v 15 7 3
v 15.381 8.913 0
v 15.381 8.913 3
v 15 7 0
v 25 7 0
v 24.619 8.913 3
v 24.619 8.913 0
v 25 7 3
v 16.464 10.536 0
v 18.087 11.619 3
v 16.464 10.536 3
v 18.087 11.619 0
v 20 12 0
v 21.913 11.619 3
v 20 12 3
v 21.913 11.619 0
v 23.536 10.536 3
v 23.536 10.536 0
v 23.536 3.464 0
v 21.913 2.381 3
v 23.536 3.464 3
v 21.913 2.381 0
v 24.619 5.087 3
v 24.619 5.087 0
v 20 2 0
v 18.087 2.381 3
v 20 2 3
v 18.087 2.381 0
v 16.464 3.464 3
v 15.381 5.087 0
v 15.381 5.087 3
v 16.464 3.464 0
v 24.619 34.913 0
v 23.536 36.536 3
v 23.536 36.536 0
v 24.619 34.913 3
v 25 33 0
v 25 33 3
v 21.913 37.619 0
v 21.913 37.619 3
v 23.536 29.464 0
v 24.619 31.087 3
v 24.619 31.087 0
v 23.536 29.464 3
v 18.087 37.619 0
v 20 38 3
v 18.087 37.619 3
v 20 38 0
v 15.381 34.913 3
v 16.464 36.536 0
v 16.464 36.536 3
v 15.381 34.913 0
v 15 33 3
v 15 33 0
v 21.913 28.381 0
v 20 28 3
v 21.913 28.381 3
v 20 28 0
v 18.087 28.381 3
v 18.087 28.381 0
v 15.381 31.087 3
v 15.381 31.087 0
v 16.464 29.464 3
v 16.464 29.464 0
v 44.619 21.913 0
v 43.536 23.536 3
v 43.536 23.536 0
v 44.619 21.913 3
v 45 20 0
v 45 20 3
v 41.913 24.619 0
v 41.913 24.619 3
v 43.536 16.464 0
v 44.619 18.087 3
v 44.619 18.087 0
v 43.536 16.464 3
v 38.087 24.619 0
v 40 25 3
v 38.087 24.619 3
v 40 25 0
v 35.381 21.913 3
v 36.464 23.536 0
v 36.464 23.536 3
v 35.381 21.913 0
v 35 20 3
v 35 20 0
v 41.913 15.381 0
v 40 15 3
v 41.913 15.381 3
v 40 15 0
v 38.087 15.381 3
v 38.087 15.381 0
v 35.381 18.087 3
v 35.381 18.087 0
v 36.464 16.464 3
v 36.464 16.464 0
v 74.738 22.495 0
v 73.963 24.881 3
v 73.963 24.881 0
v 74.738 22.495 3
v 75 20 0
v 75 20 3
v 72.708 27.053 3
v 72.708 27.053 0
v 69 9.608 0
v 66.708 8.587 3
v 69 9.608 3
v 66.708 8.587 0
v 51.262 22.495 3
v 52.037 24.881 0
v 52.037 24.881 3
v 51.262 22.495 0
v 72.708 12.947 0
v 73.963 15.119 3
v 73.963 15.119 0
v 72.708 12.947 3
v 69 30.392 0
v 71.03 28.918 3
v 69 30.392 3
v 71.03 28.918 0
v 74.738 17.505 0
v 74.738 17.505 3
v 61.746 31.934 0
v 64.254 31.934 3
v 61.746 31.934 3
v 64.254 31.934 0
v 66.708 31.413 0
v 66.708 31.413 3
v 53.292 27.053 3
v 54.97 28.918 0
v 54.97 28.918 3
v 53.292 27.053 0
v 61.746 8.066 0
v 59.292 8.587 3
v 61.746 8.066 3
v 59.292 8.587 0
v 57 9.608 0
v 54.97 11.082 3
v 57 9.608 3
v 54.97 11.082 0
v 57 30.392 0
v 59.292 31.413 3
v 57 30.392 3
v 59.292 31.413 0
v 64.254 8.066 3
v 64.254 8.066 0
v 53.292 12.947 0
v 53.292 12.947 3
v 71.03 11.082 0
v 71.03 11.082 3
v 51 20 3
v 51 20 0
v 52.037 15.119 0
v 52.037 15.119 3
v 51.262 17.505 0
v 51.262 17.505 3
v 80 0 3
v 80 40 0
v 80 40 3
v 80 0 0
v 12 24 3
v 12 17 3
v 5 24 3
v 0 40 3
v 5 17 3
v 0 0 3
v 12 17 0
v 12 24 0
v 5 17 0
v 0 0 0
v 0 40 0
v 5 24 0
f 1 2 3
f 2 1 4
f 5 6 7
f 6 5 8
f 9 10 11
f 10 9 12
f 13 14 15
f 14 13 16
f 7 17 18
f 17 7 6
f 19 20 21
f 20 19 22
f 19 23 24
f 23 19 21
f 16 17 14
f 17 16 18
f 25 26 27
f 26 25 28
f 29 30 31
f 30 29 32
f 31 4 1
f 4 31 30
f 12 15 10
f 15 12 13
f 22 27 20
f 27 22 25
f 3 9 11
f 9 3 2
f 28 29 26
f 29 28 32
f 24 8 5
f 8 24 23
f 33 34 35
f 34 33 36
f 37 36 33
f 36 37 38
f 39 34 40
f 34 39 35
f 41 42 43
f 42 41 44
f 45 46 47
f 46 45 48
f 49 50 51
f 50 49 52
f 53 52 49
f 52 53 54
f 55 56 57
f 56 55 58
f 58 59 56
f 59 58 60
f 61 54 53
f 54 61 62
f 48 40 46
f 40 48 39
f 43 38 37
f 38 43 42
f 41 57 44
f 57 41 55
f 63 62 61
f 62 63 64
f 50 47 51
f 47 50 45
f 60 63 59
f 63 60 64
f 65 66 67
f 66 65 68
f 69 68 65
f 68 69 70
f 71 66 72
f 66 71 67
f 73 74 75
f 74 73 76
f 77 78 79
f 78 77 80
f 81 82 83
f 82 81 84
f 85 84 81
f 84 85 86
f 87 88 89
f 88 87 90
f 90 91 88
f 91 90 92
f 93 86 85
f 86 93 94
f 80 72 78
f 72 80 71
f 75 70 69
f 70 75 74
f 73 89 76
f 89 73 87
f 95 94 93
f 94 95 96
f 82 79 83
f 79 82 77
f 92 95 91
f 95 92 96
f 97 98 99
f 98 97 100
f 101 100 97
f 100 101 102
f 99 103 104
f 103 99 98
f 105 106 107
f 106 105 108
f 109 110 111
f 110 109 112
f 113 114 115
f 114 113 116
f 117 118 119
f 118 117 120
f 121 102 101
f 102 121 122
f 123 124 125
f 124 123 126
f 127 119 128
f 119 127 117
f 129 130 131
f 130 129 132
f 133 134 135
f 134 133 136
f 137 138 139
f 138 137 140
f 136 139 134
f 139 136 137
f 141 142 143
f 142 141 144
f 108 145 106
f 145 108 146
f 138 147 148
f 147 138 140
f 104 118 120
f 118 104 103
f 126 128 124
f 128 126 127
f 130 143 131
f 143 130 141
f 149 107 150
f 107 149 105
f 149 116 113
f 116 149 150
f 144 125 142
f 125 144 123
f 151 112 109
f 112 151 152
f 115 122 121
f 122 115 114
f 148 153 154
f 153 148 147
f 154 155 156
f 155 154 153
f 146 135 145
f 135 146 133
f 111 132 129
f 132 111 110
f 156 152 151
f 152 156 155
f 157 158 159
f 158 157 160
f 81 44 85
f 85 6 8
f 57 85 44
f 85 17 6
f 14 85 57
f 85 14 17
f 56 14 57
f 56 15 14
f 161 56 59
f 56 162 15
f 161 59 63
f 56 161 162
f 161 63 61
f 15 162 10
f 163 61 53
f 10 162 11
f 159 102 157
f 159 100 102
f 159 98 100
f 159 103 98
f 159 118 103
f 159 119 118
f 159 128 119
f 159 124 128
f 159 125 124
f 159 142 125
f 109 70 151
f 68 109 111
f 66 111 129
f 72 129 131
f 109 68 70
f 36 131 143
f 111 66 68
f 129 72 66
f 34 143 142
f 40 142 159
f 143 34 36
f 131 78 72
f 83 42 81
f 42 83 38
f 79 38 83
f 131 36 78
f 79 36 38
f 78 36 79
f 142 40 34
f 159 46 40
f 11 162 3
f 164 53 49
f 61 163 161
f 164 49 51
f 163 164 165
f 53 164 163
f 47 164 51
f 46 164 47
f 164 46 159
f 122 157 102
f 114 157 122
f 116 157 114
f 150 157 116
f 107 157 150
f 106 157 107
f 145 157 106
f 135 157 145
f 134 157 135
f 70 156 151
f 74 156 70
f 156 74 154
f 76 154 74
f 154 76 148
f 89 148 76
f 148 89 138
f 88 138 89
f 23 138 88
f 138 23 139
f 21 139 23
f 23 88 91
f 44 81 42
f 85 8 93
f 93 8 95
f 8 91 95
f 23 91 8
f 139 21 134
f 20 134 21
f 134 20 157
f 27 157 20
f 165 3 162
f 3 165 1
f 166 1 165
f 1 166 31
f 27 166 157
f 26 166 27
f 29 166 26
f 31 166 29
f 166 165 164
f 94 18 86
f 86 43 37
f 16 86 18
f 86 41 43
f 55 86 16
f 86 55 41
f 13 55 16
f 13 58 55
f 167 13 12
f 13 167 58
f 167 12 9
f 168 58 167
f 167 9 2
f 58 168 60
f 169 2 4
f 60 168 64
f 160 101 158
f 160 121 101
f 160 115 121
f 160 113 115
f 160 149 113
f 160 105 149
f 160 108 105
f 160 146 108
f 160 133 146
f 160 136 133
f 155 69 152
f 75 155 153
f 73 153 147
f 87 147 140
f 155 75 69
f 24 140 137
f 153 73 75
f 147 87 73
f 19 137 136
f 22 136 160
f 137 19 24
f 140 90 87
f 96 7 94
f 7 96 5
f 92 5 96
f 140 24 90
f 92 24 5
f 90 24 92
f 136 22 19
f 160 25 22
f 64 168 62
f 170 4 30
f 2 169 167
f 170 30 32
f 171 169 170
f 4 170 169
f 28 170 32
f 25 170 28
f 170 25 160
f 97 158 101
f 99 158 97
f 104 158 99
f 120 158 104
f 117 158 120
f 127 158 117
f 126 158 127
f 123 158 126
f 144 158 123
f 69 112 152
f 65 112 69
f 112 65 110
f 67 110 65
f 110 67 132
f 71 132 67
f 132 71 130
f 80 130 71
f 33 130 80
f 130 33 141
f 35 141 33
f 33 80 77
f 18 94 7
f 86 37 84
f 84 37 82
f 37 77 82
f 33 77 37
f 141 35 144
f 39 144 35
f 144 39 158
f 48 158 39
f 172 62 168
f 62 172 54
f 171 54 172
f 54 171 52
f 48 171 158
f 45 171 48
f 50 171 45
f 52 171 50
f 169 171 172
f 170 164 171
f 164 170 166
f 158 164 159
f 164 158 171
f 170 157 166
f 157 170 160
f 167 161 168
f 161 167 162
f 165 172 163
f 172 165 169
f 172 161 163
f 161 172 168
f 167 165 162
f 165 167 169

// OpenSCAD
difference () {
  cube([80, 40, 3]);
  
  translate([5, 17, -1])    
    cube([7, 7, 7]);
      
  translate([10, 0, 0]){
    // X-Y POT dials
    translate([10, 7, -5])
      cylinder(h=15,d=10);
    translate([10, 33, -5])
      cylinder(h=15,d=10);
    
    // RGB Rotary Encoder + Button
    translate([30, 20, -5])
      cylinder(h=15,d=10);
    
    // Button row
    // Little buttons
    // 
    //translate([50, 10, -5])
    //  cylinder(h=15,d=5);
    //translate([50, 20, -5])
    //  cylinder(h=15,d=5);    
    //translate([50, 30, -5])
    //  cylinder(h=15,d=5);
    
    // Button row
    // Arcade button (duh)
    translate([53, 20, -5])
      cylinder(h=15,d=24);
  }  
}
/*
// Auto / Man text
rotate([0, 0, 90])
translate([20, -2, 2])
linear_extrude(height = 2) {
text("Auto / Btn", 4, "Liberation Sans",
    halign = "center", valign = "center");
}

// Mode text
rotate([0, 0, 90])
translate([20, -30, 2])
linear_extrude(height = 2) {
  text("Mode", 4, "Liberation Sans",
      halign = "center", valign = "center");
}

// Dimmer
translate([42, 37, 2])
linear_extrude(height = 2) {
  text("Dimmer", 4, "Liberation Sans",
      halign = "center", valign = "center");
}
*/
